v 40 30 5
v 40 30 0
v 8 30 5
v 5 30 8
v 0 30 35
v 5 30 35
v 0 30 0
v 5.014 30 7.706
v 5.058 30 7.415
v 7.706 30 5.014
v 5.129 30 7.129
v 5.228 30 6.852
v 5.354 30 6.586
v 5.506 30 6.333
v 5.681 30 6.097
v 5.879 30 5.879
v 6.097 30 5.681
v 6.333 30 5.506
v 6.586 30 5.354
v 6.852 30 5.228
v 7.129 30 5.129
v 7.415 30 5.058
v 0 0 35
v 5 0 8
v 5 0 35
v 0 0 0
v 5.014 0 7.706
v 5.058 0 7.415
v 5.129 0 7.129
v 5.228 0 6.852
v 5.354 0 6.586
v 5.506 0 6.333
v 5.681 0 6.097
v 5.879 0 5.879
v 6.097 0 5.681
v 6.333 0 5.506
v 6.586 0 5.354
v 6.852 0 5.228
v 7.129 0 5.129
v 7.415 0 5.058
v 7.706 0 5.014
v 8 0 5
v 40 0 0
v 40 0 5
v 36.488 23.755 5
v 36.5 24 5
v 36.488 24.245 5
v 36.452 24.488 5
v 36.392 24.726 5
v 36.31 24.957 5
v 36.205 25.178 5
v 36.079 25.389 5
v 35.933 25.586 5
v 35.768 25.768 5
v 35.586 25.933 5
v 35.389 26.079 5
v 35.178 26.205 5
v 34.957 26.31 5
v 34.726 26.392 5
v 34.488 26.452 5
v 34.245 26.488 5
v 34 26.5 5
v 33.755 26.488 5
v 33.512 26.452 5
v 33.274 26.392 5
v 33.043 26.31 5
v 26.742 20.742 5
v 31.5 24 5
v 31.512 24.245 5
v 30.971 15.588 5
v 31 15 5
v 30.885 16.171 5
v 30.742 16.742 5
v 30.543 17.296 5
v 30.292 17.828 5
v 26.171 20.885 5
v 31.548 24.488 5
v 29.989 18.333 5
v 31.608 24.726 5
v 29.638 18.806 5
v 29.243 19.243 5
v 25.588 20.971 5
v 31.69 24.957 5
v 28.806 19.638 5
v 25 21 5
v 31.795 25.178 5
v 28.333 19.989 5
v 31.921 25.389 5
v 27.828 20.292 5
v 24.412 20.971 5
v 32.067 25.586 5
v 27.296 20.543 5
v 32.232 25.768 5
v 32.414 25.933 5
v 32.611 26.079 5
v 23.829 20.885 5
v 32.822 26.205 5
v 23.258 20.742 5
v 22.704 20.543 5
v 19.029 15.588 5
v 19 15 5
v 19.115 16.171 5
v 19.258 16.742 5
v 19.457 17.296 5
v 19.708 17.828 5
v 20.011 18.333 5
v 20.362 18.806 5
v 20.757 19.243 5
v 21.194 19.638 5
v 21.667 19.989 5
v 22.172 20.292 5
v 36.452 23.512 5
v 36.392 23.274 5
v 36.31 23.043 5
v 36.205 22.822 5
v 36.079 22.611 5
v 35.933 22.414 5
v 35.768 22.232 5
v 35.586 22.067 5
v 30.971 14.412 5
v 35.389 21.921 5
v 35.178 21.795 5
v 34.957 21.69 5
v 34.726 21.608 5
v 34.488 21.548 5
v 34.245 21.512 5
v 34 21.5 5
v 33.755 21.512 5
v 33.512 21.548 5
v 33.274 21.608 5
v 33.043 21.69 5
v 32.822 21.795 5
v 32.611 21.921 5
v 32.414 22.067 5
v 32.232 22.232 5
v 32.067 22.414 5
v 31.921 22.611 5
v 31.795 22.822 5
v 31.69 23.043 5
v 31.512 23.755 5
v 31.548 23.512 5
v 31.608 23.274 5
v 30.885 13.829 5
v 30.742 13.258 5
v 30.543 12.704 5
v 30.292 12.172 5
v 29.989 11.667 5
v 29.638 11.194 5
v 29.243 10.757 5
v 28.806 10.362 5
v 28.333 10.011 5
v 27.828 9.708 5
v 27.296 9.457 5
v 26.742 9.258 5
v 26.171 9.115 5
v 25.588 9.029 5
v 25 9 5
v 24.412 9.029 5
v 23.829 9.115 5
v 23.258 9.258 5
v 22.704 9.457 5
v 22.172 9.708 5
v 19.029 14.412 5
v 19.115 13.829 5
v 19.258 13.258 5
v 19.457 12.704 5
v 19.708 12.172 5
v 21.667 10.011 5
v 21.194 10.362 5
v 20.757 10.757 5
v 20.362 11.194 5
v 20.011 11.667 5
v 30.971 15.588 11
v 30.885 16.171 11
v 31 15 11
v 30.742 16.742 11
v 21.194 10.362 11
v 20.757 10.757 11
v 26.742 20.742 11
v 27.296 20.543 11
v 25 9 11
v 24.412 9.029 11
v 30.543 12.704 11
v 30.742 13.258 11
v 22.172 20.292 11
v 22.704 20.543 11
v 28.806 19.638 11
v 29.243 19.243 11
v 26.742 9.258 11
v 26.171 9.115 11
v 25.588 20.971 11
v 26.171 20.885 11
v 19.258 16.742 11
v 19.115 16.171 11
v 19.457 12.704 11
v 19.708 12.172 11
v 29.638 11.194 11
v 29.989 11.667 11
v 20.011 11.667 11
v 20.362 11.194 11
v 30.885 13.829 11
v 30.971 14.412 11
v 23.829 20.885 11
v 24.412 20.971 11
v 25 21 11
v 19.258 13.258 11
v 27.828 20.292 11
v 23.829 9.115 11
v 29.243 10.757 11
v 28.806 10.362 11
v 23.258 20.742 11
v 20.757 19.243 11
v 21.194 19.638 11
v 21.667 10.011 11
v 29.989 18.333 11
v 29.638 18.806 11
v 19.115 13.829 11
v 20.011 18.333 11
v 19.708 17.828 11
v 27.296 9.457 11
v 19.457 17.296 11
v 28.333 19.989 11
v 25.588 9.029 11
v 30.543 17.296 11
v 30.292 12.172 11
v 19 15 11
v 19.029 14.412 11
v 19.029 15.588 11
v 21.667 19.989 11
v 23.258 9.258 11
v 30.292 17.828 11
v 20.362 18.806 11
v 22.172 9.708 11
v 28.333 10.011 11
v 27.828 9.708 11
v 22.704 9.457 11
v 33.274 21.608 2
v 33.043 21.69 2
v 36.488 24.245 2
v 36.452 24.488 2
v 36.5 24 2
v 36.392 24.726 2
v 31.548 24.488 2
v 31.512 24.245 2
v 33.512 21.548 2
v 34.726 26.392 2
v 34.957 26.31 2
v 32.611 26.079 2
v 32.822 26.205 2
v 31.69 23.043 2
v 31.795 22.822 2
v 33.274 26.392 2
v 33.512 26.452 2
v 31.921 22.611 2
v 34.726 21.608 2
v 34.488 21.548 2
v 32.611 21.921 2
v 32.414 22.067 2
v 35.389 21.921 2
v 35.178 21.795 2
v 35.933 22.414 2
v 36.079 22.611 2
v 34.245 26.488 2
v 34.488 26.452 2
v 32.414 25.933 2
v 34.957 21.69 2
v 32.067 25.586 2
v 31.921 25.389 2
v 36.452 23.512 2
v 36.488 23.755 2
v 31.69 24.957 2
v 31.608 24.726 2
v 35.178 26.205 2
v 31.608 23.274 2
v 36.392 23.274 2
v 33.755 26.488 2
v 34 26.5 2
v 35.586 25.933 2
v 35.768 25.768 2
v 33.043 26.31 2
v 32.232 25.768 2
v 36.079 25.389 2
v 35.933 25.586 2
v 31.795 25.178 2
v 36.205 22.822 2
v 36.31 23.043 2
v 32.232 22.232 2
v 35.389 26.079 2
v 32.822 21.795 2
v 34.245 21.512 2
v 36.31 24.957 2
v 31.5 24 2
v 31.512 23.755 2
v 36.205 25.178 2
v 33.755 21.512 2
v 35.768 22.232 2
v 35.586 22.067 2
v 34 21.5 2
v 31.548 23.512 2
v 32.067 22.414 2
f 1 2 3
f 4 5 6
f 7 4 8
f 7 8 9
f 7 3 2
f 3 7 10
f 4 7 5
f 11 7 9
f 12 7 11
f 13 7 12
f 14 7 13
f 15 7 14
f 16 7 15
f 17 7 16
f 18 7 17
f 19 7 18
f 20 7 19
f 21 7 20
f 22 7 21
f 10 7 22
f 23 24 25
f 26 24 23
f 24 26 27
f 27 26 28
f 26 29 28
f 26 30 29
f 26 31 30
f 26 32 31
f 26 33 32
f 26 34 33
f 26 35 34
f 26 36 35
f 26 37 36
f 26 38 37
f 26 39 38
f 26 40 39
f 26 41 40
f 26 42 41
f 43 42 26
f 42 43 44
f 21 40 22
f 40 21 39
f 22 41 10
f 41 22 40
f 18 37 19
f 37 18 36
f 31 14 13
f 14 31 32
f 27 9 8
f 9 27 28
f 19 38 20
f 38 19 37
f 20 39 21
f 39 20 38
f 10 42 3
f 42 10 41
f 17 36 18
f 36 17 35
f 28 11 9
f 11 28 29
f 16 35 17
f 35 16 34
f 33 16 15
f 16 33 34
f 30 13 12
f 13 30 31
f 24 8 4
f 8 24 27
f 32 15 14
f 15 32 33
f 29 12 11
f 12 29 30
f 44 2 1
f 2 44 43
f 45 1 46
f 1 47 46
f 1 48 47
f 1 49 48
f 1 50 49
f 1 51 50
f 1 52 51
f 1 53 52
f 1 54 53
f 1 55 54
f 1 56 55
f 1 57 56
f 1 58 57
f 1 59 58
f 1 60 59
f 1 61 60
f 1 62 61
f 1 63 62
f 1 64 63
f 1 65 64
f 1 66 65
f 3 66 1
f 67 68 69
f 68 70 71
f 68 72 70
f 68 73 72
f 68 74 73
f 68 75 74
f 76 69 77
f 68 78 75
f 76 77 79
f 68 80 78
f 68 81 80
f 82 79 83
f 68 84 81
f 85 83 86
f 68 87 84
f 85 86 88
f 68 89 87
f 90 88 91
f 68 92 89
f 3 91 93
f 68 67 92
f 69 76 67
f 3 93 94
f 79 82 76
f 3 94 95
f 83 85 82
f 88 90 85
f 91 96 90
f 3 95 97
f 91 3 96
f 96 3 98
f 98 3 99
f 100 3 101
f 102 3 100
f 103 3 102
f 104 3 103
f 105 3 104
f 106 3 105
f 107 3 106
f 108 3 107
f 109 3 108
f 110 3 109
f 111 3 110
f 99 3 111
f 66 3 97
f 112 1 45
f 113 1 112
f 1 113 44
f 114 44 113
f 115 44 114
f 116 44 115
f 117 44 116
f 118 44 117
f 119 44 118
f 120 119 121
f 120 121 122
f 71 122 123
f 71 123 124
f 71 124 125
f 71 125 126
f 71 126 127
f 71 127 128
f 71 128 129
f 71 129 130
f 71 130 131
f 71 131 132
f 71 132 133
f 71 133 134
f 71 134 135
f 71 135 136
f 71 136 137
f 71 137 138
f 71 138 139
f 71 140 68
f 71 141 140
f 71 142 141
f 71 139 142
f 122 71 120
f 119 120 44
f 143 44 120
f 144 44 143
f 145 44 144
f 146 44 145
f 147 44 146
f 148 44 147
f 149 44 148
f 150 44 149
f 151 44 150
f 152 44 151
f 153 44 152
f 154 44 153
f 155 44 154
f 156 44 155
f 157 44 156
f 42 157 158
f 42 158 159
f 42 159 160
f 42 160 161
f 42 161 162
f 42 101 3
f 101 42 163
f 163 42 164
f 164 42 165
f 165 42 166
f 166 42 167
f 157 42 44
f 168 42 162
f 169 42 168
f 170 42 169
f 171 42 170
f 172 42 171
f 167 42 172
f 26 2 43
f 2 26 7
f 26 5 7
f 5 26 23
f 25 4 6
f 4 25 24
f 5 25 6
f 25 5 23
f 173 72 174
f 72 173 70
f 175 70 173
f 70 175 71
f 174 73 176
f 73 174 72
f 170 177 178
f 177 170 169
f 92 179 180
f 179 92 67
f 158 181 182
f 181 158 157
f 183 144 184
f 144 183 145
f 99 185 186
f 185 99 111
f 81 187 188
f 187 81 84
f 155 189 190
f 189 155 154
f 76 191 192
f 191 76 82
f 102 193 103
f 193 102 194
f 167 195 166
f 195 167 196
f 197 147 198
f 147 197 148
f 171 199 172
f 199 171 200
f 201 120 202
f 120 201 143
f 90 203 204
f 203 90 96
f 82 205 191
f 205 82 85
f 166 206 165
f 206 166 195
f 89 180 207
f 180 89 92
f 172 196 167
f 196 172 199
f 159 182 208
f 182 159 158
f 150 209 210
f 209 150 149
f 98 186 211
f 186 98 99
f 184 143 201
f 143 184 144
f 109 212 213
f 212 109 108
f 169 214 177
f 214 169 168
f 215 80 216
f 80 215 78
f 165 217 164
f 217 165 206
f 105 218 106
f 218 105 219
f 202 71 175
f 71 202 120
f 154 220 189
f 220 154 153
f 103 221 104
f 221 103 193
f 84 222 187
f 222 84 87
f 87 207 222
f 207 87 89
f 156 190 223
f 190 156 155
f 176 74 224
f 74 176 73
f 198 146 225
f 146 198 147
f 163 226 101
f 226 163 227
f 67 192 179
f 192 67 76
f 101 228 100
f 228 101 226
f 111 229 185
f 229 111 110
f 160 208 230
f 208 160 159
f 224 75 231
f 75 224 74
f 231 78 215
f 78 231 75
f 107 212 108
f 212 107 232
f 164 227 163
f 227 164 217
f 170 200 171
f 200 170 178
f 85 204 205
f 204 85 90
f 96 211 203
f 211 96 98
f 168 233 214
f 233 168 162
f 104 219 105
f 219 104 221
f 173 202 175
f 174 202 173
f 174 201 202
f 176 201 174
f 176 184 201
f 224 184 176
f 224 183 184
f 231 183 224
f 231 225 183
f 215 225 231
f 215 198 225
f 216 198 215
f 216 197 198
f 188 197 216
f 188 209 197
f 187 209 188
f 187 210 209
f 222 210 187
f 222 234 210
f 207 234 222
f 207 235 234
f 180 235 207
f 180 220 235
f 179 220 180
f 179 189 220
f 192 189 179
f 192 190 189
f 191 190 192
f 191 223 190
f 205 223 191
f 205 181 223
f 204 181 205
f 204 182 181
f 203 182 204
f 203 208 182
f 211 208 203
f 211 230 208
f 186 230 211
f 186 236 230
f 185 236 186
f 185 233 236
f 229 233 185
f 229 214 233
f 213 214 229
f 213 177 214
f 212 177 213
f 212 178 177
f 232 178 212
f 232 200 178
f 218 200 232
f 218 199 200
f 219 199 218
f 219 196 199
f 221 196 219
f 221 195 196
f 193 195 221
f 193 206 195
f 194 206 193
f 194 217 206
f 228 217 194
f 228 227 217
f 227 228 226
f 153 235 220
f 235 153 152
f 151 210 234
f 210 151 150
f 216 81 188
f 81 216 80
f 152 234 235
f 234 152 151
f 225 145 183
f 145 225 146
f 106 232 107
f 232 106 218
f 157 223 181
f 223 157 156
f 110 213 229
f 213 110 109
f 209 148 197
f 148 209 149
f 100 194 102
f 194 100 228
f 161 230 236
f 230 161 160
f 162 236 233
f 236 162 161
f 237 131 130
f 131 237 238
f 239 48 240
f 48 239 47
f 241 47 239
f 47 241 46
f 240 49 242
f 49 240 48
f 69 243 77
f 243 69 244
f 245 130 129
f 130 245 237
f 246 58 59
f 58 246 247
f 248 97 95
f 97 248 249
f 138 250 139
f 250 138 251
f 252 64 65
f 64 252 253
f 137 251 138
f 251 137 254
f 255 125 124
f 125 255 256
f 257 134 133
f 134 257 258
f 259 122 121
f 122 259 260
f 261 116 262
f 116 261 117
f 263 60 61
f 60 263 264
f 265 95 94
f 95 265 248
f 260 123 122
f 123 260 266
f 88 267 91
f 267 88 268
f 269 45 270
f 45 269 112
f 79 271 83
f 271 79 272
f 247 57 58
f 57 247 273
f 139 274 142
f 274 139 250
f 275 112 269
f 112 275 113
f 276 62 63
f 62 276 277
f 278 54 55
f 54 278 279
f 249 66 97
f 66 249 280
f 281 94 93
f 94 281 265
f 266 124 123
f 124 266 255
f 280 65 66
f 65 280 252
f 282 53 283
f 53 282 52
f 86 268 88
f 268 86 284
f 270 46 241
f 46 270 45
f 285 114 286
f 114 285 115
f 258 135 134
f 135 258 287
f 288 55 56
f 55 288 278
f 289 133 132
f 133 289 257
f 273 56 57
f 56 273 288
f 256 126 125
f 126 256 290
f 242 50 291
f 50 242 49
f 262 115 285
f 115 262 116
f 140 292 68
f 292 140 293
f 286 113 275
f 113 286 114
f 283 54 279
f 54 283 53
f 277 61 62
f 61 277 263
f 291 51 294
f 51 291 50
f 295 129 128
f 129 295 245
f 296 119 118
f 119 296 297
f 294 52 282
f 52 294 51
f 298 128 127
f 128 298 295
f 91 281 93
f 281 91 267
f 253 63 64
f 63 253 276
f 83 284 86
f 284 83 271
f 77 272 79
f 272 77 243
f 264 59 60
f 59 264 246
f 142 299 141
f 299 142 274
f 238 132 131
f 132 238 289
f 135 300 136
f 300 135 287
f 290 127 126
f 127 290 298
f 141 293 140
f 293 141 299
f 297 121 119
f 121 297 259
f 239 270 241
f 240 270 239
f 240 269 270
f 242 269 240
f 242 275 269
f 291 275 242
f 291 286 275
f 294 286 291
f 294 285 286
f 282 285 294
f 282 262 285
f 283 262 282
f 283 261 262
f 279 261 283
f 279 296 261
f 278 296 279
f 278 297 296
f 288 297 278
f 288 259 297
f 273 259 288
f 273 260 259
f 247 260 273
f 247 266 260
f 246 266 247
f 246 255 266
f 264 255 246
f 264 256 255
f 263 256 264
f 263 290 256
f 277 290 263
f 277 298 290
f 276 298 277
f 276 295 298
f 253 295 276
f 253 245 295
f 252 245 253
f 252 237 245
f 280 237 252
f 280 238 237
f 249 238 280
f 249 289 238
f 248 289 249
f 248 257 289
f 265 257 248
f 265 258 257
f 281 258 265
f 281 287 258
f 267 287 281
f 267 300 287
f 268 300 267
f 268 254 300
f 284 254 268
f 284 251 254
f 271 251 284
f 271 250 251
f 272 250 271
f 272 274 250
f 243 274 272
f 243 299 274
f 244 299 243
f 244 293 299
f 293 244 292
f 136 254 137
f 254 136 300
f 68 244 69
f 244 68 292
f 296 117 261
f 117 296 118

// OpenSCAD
// file: composite_bracket.scad
// Composite bracket: ground truth for the segmentation pipeline.
// See docs/planning/segmentation_composite_bracket.md and composite_bracket_expected.json.
// Hand-written (not generated from the feature-fixture manifest).
$fn = 64;

module composite_bracket() {
    difference() {
        union() {
            cube([40, 30, 5]);                          // base
            cube([5, 30, 35]);                          // wall
            difference() {                              // R3 fillet, inner corner, axis Y
                translate([4, 0, 4]) cube([4, 30, 4]);
                translate([8, -1, 8]) rotate([-90, 0, 0]) cylinder(r = 3, h = 32);
            }
            translate([25, 15, 4]) cylinder(r = 6, h = 7);   // boss, top at z = 11
        }
        translate([34, 24, 2]) cylinder(r = 2.5, h = 4);     // blind hole, floor at z = 2
    }
}

composite_bracket();
// main file
// OpenSCAD defaults: $fn=0, $fa=12, $fs=2 (no resolution override).
use <composite_bracket.scad>
composite_bracket();
